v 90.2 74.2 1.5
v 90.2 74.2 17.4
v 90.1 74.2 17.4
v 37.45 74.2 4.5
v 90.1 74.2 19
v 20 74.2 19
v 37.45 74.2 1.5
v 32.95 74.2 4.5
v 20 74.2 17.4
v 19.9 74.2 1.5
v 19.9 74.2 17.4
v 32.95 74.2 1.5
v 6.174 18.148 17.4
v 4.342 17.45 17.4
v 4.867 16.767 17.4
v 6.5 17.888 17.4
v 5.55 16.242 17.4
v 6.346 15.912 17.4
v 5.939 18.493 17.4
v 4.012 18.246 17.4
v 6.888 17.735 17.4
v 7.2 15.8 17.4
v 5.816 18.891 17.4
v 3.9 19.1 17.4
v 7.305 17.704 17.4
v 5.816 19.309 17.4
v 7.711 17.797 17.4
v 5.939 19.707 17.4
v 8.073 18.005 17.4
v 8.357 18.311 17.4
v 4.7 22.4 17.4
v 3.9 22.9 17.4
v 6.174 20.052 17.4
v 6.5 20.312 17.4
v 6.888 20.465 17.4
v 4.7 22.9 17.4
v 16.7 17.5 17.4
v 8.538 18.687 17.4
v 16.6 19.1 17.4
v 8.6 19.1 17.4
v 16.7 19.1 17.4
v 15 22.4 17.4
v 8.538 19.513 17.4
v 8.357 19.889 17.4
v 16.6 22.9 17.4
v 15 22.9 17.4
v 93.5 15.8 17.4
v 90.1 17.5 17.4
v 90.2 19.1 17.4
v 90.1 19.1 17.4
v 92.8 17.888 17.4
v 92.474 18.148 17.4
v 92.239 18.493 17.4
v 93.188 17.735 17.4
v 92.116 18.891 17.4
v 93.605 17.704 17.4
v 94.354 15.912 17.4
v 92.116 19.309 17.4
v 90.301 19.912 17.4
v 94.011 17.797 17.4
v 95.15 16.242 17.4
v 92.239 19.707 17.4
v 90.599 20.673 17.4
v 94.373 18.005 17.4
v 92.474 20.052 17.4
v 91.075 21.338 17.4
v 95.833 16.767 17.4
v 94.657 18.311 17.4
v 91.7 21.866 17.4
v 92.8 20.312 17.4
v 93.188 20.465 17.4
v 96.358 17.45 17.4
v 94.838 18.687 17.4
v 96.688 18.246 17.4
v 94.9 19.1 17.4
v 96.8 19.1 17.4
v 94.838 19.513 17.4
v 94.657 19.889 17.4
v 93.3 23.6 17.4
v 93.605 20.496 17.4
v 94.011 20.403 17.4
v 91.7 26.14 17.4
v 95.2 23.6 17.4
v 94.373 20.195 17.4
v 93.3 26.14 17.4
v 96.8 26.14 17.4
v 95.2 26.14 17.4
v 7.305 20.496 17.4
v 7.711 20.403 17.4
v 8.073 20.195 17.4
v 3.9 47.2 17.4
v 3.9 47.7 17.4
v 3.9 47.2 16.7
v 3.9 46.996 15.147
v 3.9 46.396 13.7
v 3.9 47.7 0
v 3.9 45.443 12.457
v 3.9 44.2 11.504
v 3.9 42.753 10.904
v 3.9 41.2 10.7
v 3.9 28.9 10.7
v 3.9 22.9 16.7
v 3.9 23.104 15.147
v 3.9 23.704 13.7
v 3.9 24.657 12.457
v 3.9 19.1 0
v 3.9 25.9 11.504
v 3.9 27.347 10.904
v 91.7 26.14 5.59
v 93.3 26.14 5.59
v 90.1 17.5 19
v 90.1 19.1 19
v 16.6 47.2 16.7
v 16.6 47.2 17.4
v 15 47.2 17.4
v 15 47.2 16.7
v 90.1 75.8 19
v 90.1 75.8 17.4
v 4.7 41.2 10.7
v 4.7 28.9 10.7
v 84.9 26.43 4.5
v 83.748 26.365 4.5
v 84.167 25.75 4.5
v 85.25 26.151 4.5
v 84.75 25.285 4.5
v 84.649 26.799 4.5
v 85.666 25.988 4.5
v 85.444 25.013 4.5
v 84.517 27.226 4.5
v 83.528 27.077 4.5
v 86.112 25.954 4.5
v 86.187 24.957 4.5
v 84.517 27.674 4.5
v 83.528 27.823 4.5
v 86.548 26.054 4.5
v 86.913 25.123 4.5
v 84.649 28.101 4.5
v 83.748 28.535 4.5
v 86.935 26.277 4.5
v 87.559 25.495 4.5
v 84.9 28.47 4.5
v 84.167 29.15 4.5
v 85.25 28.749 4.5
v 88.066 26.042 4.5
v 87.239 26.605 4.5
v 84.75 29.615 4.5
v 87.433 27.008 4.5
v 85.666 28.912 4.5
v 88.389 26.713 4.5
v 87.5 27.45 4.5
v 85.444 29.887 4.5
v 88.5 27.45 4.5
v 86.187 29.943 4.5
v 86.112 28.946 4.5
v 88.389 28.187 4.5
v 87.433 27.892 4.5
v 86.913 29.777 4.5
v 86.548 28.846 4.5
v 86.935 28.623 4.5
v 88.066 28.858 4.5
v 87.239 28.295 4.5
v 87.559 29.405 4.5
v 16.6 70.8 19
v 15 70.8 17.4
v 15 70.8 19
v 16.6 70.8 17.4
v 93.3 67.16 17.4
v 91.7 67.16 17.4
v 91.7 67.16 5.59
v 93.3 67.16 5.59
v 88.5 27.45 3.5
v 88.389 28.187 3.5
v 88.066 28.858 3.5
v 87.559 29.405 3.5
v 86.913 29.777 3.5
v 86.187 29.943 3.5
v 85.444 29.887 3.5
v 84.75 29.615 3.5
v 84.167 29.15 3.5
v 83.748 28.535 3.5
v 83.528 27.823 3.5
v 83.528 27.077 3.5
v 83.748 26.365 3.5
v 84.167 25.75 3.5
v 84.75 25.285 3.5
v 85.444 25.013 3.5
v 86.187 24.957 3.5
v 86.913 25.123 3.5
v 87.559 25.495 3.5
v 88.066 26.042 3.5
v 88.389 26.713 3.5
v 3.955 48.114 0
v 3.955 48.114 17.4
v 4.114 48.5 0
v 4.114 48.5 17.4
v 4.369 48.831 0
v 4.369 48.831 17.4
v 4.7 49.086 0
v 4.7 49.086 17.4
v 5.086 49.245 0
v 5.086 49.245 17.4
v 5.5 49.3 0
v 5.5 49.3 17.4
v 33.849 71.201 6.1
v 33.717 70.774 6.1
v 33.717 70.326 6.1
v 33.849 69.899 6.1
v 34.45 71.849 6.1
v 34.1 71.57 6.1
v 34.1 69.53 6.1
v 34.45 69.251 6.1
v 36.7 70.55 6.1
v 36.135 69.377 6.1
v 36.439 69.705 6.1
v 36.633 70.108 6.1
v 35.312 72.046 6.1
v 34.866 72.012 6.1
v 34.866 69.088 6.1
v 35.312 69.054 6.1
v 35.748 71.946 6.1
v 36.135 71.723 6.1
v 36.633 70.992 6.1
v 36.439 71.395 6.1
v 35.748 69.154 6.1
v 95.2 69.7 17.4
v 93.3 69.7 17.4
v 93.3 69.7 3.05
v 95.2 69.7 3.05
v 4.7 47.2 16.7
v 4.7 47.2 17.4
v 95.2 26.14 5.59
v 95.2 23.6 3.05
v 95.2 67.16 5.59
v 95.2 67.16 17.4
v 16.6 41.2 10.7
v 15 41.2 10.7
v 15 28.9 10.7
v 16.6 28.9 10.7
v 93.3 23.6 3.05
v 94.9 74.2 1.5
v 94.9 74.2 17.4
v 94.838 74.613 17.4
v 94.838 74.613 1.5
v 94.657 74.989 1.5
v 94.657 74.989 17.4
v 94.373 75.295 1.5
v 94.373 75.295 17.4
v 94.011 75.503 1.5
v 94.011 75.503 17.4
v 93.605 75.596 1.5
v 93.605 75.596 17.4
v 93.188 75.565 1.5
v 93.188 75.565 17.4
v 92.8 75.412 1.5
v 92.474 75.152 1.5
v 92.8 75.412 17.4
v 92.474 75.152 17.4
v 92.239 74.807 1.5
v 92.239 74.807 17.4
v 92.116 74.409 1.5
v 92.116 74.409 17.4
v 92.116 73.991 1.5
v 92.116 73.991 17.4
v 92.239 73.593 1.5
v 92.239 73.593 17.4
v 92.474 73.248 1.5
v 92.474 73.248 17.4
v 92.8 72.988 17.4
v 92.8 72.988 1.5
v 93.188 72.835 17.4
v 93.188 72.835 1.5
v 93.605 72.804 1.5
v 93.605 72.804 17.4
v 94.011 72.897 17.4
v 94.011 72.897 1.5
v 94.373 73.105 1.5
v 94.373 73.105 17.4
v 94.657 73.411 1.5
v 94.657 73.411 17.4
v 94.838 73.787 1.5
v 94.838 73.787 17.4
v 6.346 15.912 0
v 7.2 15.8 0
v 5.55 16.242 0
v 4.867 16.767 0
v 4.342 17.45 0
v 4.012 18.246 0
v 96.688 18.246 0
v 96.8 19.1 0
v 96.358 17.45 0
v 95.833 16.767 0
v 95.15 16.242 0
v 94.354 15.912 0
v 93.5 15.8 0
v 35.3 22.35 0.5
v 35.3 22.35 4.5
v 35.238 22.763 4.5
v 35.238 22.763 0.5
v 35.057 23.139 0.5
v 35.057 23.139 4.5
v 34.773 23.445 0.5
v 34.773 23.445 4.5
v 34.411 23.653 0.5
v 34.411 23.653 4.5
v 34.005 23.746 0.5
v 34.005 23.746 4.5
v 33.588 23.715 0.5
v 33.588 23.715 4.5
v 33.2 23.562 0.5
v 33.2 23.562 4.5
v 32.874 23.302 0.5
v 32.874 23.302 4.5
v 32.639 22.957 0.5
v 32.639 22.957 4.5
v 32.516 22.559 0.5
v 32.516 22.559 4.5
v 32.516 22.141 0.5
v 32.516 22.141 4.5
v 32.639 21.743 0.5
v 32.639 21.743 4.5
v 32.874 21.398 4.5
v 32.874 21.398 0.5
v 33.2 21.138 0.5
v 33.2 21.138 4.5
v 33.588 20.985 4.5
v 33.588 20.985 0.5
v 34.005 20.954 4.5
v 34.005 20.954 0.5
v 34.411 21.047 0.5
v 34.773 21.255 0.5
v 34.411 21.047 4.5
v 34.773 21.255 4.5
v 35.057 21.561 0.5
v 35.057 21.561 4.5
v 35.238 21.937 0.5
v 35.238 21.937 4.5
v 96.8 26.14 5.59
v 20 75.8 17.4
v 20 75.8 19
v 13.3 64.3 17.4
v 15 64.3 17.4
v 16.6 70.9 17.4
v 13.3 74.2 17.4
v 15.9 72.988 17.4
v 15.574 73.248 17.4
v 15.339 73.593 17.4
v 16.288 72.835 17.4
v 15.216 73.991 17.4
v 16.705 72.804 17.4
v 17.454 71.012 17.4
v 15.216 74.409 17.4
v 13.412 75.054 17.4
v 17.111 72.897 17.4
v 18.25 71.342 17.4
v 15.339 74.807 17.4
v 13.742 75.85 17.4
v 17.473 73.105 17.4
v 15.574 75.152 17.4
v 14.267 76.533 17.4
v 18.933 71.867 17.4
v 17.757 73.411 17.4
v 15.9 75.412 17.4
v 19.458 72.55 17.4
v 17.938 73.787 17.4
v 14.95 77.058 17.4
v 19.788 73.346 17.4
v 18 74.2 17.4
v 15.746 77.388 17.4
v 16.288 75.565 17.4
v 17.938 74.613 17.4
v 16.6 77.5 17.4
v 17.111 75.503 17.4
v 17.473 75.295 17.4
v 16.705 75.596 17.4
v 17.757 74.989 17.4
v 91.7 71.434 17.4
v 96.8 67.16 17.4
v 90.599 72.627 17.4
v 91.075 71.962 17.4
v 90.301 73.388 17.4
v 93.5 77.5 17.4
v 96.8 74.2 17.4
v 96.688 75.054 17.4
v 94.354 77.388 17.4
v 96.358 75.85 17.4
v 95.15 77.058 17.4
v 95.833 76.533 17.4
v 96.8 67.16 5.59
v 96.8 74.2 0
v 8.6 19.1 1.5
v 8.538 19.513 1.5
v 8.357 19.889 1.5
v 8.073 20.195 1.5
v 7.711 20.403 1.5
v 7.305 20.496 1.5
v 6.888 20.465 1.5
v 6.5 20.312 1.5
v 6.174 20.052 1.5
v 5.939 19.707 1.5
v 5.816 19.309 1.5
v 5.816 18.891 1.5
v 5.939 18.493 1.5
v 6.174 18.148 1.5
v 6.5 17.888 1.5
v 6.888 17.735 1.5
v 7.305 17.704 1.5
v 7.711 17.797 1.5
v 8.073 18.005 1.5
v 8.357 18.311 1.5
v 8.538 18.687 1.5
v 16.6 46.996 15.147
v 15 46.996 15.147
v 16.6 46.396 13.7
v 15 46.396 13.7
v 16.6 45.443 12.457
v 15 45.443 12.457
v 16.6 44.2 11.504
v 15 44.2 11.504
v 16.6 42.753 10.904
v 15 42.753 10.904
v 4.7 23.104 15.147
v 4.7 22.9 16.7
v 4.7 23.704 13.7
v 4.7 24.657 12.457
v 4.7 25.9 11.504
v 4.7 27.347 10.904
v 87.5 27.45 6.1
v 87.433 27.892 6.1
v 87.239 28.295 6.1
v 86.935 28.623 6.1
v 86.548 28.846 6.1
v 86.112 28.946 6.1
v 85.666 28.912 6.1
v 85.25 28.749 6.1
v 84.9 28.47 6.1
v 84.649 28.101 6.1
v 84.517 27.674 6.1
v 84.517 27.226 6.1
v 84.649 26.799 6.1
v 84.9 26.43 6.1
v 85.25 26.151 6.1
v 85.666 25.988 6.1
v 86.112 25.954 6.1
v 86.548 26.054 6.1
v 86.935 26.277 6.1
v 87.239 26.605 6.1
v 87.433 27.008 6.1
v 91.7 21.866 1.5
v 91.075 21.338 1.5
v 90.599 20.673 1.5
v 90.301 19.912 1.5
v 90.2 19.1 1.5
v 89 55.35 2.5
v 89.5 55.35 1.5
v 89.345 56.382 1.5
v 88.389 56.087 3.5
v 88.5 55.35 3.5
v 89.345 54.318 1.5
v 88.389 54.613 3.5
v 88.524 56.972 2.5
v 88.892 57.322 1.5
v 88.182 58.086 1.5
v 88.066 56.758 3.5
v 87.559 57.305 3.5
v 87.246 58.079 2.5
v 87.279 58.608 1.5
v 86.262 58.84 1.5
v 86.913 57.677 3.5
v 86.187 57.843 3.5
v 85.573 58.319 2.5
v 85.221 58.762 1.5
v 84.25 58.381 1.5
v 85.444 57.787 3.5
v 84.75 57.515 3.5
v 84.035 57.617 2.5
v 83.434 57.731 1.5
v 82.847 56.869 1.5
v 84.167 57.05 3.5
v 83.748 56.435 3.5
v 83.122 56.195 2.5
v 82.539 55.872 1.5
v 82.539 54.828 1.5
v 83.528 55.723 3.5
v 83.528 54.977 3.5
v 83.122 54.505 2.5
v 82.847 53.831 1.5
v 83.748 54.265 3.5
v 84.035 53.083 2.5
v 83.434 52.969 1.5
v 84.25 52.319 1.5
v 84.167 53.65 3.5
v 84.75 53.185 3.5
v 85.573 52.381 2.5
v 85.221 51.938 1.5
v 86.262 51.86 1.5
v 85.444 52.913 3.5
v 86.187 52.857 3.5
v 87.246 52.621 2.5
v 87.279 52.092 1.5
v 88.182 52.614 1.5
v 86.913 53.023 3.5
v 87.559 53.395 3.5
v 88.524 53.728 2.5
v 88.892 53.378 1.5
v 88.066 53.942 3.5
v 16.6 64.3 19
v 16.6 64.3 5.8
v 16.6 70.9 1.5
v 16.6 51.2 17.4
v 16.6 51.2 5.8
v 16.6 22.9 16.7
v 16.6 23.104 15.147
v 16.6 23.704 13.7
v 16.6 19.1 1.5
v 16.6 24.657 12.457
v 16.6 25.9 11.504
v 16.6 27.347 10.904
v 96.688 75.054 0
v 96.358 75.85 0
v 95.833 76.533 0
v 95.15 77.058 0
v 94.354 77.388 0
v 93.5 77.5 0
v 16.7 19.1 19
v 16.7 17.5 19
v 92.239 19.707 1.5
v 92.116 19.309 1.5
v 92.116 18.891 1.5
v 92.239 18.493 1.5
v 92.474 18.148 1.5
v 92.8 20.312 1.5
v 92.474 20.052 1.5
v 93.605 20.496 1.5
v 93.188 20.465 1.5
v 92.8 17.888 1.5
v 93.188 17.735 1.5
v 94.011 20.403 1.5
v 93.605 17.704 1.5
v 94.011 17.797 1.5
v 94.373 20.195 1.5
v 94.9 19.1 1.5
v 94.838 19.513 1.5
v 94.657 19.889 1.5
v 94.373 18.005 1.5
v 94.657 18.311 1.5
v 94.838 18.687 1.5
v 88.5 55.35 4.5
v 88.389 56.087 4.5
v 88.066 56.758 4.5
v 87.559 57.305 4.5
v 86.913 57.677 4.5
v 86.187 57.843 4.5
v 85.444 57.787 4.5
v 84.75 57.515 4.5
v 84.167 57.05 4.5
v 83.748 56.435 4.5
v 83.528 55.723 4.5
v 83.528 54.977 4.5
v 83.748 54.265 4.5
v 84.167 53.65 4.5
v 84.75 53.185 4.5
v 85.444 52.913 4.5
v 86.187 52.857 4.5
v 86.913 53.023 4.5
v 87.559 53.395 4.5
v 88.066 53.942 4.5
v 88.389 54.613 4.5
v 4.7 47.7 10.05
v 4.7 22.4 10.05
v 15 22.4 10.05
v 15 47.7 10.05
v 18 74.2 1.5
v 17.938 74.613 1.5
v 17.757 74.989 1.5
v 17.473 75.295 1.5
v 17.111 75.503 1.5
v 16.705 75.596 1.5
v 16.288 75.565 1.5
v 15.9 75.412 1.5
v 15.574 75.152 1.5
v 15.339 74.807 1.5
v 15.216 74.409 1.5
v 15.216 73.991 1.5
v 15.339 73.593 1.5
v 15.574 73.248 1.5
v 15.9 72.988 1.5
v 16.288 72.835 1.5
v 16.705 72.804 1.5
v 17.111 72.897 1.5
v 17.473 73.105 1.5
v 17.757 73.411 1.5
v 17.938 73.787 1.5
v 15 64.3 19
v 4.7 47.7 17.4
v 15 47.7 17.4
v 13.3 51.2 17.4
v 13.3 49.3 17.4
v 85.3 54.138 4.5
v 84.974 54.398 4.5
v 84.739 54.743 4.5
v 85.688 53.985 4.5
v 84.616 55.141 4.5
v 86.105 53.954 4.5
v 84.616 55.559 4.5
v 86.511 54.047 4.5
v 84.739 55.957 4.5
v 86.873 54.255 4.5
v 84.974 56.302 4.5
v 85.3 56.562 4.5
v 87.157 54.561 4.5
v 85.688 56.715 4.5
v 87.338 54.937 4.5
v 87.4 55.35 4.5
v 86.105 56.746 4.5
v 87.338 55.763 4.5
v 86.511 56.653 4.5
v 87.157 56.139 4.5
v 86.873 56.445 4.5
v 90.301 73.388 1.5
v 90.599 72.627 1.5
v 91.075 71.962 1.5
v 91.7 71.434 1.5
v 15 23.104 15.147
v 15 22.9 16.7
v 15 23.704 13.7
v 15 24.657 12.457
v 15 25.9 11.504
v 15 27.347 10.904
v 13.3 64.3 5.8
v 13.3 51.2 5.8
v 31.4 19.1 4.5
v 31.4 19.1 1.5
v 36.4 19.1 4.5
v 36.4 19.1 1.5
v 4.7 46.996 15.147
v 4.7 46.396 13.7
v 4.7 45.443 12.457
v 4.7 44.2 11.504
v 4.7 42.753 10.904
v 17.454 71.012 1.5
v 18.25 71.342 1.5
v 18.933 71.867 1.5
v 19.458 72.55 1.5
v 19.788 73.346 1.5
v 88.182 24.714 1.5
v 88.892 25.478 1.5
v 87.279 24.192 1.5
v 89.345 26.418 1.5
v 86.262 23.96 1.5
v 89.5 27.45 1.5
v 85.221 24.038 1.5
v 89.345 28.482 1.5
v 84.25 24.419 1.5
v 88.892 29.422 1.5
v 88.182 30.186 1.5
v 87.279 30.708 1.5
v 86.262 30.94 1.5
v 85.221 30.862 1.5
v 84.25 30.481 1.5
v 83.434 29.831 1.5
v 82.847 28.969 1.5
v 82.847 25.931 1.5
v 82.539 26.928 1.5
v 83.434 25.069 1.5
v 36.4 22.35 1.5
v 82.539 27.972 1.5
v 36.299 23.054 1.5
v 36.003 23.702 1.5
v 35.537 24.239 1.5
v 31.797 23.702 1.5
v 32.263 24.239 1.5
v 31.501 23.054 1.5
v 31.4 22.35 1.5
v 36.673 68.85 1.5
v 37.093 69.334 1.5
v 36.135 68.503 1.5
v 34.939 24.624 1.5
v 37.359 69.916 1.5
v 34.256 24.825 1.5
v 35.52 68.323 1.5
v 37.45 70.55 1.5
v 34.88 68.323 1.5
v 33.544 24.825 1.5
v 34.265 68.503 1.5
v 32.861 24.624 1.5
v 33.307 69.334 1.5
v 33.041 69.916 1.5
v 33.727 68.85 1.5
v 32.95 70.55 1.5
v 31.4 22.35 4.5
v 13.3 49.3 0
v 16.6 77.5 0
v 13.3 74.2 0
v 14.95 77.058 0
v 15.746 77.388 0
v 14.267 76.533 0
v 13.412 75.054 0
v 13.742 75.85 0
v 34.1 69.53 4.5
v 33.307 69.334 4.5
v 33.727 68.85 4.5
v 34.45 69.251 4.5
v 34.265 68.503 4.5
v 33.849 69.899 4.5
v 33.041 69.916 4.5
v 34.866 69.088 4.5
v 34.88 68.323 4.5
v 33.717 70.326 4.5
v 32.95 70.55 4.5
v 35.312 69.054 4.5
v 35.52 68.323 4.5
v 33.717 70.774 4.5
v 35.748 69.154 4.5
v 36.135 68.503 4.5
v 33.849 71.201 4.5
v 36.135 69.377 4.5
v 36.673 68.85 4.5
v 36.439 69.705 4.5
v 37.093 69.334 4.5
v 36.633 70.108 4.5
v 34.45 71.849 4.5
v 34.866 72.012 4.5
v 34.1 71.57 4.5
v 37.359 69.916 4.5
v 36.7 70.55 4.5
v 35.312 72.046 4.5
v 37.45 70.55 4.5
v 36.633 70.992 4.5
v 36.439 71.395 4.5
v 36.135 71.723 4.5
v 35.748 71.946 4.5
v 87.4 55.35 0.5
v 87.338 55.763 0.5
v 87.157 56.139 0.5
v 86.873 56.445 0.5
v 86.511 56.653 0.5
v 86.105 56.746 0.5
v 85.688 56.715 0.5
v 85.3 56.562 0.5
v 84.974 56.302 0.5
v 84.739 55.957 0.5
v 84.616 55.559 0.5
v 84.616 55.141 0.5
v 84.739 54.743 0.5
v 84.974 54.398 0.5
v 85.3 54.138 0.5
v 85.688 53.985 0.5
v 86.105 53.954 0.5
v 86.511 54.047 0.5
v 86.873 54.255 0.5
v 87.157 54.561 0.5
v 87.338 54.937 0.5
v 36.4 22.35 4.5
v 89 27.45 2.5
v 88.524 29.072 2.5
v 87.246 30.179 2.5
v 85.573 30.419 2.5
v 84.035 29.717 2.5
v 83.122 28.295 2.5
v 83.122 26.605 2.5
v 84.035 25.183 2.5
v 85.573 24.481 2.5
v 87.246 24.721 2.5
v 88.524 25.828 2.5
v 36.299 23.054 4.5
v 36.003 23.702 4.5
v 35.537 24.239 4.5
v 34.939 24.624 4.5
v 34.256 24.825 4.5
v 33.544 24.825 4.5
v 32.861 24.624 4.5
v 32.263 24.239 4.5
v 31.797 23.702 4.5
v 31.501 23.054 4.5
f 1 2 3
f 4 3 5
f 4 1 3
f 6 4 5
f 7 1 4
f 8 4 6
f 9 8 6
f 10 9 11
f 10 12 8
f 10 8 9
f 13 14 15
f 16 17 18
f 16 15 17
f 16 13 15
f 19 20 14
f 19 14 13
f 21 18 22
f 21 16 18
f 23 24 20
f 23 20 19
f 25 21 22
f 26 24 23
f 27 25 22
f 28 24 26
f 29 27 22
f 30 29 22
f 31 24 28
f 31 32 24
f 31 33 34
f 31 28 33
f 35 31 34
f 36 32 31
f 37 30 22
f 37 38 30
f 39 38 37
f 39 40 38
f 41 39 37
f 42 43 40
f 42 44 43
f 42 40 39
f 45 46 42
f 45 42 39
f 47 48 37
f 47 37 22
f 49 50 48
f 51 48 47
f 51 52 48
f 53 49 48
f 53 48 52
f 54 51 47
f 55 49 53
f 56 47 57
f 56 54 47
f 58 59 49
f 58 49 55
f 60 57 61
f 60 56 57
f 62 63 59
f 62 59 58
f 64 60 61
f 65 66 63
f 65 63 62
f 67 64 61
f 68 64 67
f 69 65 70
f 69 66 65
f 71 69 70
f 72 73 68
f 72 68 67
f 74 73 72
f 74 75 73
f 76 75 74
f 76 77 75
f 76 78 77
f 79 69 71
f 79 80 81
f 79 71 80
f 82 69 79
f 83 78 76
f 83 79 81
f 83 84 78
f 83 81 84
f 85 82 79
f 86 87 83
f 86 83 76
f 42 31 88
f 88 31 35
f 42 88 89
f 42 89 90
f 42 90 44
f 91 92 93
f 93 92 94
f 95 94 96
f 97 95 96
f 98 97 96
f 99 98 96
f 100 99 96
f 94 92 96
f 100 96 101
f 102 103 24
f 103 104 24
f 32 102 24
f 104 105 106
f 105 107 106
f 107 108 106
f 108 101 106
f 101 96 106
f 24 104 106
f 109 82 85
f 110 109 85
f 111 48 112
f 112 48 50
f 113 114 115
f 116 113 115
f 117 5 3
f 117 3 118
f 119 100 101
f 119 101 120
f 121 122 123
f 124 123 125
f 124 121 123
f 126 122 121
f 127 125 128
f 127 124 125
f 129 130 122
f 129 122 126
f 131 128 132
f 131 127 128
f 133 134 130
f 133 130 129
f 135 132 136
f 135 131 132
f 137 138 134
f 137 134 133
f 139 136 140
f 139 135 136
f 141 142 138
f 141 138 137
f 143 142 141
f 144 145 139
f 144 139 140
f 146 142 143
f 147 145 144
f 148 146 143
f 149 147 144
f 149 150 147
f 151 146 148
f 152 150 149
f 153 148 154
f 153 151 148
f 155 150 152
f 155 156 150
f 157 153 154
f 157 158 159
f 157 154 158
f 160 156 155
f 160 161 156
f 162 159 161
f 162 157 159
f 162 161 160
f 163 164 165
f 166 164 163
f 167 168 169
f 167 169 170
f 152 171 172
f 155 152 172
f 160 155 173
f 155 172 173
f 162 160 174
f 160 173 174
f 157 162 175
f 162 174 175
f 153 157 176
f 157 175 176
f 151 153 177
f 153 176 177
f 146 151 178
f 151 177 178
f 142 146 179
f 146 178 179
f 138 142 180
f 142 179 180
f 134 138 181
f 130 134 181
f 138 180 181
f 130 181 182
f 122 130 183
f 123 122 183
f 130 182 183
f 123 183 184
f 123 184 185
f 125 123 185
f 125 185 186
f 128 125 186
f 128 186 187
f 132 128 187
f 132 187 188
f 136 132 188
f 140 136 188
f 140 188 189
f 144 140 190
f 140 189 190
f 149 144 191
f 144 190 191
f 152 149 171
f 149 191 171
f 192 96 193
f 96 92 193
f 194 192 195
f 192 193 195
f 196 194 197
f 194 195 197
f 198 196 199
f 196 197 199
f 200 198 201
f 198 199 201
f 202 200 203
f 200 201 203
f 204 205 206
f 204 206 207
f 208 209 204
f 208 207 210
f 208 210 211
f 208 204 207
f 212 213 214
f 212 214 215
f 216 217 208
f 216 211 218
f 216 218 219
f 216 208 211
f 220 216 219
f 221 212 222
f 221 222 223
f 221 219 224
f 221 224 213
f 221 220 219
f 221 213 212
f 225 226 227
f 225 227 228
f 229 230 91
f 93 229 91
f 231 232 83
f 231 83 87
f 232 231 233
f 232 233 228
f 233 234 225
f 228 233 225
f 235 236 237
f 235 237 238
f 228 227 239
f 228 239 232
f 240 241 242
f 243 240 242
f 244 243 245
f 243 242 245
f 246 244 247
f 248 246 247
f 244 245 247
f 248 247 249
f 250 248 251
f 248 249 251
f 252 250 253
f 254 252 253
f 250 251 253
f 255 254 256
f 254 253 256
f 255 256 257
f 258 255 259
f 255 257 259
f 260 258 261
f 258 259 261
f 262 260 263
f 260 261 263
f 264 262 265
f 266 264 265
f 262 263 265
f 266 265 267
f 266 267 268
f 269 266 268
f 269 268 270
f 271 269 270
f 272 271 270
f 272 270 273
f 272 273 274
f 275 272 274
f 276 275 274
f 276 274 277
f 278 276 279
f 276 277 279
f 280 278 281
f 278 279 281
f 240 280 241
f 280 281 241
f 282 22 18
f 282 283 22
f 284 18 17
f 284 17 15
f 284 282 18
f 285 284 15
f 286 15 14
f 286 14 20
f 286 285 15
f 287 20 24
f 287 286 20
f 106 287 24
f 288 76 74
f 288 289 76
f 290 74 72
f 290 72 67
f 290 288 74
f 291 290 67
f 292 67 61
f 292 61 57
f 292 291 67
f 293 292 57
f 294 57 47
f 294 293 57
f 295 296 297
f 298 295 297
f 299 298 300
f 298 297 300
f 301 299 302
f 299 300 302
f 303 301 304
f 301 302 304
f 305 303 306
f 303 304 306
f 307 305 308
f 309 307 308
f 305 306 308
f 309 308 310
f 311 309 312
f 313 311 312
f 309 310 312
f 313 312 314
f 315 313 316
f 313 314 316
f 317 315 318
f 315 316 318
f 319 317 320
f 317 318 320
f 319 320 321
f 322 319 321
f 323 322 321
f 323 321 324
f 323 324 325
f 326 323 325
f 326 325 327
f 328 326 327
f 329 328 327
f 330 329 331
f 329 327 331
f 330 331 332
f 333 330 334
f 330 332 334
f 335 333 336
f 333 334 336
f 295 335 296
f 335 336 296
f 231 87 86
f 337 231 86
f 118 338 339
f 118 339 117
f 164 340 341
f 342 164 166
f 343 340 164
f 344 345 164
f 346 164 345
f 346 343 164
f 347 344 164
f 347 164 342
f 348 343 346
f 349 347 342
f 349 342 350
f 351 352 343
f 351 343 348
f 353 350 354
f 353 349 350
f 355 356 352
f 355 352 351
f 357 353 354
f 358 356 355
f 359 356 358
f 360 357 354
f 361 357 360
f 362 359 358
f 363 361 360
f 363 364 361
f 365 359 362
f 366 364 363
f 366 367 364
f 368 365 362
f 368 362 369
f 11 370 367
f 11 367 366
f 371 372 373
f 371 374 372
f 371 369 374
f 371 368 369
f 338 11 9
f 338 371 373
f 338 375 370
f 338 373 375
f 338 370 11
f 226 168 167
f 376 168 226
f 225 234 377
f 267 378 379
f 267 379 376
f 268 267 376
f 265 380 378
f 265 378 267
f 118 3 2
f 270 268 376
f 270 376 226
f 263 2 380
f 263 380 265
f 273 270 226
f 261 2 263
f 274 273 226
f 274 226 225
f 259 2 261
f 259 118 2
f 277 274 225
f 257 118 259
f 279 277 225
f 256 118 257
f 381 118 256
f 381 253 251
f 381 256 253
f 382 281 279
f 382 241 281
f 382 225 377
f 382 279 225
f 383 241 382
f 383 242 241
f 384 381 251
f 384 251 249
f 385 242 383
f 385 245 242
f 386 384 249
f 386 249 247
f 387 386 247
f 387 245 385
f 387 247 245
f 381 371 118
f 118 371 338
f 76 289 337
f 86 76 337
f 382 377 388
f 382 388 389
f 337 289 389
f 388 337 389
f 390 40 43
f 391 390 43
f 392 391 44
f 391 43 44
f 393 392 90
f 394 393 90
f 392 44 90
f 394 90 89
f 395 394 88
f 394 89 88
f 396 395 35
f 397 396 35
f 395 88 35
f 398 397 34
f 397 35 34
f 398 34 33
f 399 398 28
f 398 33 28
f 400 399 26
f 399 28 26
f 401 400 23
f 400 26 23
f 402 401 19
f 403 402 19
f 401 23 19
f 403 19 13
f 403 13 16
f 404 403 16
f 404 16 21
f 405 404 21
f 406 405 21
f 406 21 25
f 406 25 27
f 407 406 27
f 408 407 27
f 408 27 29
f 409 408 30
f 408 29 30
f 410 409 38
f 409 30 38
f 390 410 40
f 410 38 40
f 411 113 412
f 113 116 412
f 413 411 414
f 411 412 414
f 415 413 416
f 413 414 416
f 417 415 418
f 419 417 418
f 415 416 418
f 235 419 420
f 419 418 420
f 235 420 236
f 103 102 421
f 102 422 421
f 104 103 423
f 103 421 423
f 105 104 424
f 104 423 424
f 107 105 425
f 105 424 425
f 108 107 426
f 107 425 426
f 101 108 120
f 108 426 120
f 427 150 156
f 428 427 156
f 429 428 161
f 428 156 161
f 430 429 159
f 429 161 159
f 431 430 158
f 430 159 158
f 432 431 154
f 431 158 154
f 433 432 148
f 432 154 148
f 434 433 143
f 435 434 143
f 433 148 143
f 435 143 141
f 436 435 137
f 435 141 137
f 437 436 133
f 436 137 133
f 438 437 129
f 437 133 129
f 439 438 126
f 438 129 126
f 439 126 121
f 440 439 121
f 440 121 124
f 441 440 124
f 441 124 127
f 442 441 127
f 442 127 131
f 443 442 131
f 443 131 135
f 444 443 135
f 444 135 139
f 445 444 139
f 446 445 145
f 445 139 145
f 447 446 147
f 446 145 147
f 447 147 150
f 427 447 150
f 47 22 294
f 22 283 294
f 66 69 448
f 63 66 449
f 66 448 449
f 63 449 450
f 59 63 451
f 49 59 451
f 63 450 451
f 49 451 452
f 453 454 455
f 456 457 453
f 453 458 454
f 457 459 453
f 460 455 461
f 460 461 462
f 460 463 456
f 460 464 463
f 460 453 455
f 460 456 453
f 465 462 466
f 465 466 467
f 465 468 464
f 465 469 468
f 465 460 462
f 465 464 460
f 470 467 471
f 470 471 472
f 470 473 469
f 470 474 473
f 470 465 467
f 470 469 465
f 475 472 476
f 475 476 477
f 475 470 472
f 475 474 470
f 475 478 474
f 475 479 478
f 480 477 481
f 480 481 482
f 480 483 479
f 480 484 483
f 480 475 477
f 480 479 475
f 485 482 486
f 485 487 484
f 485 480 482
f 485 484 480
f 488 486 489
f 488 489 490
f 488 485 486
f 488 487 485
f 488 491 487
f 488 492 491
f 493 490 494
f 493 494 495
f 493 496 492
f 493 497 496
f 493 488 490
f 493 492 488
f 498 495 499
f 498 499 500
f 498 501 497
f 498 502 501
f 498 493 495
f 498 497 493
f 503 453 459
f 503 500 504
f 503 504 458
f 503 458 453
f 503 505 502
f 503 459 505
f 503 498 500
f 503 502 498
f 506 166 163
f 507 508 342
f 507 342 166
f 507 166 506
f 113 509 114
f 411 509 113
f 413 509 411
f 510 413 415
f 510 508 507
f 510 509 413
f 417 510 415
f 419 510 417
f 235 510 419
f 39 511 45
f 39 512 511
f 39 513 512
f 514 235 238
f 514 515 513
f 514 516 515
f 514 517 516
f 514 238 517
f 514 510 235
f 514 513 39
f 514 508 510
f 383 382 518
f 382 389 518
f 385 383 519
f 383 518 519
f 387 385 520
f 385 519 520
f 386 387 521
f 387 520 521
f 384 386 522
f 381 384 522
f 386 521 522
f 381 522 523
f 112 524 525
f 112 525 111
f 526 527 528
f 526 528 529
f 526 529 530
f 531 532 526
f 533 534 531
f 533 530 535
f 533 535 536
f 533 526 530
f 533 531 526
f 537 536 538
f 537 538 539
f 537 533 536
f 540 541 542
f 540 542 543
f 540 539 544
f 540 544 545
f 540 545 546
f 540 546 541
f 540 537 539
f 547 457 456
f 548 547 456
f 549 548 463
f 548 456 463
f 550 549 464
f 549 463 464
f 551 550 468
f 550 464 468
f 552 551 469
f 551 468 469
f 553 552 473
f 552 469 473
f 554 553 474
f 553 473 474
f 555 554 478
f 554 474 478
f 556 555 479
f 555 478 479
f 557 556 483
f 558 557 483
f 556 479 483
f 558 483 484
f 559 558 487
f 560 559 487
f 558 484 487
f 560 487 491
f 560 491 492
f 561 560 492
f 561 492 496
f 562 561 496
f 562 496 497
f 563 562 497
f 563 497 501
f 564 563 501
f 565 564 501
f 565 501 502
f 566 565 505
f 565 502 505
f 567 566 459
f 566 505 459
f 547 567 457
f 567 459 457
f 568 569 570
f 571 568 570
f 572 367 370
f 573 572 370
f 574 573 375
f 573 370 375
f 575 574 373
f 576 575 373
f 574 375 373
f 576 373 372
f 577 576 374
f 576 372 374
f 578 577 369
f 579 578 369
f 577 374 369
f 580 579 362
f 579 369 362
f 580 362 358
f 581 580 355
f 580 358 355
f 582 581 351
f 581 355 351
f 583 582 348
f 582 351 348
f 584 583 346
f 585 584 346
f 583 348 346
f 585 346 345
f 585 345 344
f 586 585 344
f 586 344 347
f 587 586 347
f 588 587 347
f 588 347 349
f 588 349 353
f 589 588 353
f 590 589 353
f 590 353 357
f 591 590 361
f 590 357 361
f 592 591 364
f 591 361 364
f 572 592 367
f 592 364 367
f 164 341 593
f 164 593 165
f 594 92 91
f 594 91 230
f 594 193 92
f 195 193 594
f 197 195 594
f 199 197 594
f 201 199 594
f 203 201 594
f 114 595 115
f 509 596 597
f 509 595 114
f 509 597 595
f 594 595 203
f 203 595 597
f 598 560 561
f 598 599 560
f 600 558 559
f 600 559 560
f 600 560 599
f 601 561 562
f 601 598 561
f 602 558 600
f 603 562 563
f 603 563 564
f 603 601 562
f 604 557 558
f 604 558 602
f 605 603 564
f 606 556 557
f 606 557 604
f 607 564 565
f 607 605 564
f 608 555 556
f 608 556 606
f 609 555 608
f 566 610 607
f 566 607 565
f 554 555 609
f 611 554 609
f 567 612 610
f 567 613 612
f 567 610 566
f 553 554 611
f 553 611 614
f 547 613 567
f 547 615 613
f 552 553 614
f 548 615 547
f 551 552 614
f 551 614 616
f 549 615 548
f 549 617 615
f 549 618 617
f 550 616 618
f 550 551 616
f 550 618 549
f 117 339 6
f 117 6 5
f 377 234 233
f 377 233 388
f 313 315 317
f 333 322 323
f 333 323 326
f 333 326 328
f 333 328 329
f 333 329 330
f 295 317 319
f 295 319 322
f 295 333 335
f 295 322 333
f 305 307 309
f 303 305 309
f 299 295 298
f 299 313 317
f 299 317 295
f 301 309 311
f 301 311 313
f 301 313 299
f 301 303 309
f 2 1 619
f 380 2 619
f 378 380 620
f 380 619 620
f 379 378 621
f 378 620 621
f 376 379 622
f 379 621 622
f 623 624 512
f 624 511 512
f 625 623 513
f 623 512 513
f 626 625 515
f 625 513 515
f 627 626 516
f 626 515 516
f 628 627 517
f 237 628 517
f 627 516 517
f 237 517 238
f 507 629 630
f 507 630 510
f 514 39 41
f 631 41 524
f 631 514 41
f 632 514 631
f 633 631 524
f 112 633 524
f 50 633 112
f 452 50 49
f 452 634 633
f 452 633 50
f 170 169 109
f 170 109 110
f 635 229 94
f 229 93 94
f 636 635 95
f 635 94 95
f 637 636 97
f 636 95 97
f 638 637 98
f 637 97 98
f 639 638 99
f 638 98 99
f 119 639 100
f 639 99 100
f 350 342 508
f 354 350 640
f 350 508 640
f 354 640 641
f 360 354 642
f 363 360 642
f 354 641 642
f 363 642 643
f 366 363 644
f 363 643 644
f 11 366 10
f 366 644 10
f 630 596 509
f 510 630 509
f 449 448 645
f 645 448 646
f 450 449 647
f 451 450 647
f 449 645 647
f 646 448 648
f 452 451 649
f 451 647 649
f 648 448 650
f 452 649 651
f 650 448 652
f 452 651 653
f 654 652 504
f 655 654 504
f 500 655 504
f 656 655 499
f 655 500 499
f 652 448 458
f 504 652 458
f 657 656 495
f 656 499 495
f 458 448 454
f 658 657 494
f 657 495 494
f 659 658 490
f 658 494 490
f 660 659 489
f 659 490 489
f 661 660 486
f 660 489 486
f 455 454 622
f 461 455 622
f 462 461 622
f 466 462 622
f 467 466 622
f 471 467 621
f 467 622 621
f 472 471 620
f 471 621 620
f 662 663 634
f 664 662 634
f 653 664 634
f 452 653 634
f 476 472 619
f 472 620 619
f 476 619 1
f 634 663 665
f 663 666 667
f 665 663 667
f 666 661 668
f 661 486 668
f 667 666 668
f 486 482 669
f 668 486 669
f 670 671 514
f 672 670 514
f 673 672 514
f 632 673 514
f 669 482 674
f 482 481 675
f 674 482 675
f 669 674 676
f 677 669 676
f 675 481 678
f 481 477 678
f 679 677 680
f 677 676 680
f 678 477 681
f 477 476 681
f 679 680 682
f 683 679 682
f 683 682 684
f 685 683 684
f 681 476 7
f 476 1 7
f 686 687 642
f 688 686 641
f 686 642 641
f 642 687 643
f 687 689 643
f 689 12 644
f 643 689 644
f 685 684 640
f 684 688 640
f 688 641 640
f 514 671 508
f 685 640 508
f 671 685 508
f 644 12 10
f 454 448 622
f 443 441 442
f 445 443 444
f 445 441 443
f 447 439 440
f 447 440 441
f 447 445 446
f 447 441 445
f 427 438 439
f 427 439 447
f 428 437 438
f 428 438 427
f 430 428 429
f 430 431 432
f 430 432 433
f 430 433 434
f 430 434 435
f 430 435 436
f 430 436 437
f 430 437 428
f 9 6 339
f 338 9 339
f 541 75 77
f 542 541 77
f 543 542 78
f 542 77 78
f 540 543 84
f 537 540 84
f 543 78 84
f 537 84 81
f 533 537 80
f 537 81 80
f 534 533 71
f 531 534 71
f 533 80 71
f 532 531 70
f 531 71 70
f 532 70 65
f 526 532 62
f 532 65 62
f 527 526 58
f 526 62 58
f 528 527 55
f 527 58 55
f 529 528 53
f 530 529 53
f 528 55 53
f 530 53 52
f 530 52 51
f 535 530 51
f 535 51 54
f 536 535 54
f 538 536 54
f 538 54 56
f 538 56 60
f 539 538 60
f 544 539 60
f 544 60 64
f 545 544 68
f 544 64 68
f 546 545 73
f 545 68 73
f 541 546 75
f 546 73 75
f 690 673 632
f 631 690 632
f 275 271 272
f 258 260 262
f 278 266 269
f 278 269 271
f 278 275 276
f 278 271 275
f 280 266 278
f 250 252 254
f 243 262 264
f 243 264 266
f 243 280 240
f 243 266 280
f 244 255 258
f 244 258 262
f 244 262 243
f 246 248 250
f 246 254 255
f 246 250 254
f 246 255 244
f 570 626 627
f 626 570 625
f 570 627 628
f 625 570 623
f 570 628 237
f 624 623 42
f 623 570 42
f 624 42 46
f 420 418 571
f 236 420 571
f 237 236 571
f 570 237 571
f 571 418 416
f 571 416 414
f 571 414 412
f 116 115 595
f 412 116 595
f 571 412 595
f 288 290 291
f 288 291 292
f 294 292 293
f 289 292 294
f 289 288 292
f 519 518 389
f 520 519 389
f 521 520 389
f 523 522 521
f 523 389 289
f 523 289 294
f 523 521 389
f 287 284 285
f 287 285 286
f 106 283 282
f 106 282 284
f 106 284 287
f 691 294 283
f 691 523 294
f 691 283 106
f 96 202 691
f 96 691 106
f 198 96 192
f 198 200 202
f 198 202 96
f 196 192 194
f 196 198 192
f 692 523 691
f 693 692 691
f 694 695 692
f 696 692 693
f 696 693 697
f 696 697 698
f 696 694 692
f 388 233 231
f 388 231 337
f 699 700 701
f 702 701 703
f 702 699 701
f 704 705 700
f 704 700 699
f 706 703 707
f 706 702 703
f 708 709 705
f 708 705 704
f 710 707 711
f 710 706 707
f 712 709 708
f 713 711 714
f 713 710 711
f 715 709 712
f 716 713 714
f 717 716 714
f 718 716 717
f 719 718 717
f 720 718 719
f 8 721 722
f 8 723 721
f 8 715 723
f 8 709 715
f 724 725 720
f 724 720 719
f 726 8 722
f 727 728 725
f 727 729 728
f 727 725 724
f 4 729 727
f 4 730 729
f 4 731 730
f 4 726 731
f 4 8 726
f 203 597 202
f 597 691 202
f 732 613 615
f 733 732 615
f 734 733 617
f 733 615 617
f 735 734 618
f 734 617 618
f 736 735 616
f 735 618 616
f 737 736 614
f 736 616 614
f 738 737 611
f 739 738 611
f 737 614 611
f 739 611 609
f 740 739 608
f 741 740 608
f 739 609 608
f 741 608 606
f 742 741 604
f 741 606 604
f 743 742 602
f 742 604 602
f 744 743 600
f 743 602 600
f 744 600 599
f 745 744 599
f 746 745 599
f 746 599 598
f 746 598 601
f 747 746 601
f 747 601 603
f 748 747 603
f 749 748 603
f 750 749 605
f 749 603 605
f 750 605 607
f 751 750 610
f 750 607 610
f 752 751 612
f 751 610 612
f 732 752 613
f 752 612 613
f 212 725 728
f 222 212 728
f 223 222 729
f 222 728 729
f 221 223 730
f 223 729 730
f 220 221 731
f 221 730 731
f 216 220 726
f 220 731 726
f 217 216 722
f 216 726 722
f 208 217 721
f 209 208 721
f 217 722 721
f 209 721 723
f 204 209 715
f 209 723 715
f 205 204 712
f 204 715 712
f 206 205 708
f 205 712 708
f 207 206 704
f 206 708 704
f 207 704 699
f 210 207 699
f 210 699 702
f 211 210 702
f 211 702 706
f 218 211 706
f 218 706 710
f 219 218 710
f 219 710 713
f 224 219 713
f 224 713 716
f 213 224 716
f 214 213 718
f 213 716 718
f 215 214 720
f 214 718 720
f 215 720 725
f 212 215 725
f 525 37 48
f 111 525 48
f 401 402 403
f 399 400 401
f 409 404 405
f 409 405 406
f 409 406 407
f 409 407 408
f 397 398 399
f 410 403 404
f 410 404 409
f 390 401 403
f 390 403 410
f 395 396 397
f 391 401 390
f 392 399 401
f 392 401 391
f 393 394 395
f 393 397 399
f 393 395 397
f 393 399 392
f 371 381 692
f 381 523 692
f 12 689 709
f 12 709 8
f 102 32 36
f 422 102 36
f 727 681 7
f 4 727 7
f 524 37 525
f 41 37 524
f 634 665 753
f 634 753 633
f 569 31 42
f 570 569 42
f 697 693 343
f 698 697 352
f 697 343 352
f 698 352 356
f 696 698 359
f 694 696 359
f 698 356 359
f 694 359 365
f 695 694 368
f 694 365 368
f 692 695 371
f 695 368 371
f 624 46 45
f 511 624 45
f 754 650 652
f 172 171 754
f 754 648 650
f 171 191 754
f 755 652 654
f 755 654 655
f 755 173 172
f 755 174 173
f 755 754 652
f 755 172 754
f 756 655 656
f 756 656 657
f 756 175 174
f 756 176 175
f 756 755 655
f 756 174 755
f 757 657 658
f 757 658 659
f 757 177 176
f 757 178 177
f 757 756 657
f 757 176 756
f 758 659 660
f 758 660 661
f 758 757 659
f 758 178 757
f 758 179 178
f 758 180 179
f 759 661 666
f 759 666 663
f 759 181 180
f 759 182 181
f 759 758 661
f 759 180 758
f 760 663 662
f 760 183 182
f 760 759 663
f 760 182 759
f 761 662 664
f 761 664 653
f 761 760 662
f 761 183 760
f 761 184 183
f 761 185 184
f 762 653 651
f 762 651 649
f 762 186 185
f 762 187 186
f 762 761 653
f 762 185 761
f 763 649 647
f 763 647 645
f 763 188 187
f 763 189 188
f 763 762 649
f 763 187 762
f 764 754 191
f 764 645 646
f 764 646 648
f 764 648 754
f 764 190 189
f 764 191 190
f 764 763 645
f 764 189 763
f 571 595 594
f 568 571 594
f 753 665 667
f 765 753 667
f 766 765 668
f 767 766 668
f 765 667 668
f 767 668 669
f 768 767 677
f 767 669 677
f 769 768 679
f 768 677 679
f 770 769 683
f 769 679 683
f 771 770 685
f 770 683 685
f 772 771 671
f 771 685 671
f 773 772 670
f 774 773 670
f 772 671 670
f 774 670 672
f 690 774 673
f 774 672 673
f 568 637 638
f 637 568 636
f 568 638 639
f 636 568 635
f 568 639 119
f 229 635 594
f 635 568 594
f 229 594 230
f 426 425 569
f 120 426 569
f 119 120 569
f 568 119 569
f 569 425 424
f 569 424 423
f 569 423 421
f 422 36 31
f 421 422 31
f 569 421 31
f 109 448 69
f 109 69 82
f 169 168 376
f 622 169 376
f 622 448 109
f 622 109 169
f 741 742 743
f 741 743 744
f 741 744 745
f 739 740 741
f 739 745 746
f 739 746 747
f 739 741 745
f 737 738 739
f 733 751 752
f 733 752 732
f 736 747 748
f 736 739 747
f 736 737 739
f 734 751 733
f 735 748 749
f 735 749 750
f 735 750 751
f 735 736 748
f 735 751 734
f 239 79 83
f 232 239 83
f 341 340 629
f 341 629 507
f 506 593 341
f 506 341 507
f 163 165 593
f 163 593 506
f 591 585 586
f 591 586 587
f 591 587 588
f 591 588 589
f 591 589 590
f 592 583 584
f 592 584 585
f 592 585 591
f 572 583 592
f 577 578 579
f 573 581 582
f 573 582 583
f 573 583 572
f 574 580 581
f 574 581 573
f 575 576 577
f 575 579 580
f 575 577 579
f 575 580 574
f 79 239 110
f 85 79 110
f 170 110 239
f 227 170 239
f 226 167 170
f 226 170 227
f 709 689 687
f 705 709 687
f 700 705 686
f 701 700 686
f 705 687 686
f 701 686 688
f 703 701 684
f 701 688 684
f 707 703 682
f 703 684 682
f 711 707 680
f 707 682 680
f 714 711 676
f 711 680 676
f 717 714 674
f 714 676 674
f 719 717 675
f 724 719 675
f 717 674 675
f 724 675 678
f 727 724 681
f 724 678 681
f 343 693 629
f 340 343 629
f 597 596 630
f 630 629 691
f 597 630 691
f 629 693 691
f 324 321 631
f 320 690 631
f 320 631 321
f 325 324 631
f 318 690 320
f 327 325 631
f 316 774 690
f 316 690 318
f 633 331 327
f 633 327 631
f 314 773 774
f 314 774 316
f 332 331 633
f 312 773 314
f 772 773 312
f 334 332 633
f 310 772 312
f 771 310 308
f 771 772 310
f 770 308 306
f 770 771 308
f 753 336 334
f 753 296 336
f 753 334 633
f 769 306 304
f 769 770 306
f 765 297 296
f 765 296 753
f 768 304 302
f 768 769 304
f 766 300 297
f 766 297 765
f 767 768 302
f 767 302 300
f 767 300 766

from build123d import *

# Parameters (mm, degrees)
PAD_DEPTH       = 1.5
PAD001_DEPTH    = 15.9
SKETCH003_R     = 2.5
PAD002_DEPTH    = 3
SKETCH004_R     = 1.5
PAD003_DEPTH    = 1.6
SKETCH005_W     = 70.1
SKETCH005_H     = 1.6
SKETCH005_W_2   = 1.6
SKETCH005_H_2   = 11.9
SKETCH005_W_3   = 73.4
PAD004_DEPTH    = 1.6
SKETCH007_W     = 1.9
SKETCH007_H     = 46.1
POCKET001_DEPTH = 14.35
SKETCH008_W     = 5.6
SKETCH008_H     = 41.02
POCKET002_DEPTH = 11.81
SKETCH009_W     = 4.8
SKETCH009_H     = 13.1
POCKET003_DEPTH = 13.2
SKETCH010_R     = 1.4
POCKET004_DEPTH = 15.9
POCKET_DEPTH    = 6.7
SKETCH014_W     = 10.3
SKETCH014_H     = 25.3
POCKET006_DEPTH = 0.65
SKETCH023_R     = 1.4
POCKET014_DEPTH = 4
CHAMFER_SIZE2   = 2
CHAMFER_SIZE    = 1
FILLET_R        = 3.3
FILLET001_R     = 1.6
FILLET002_R     = 6


with BuildPart() as part:
    # Sketch → Pad (new body)
    with BuildSketch(Plane.XY):
        Polygon((13.3, 49.3), (13.3, 77.5), (96.8, 77.5), (96.8, 15.8), (3.9, 15.8), (3.9, 49.3), align=None)
    extrude(amount=PAD_DEPTH)

    # Sketch001 (on Face8 of Pad) → Pad001 (join)
    with BuildSketch(Plane.XY.offset(1.5)):
        Polygon((96.8, 77.5), (13.3, 77.5), (13.3, 49.3), (3.9, 49.3), (3.9, 15.8), (96.8, 15.8), align=None)
        with BuildLine():
            Line((16.6, 70.9), (16.6, 19.1))
            Line((16.6, 19.1), (90.2, 19.1))
            ThreePointArc((91.7, 21.865863), (90.599138, 20.673213), (90.2, 19.1))
            Line((91.7, 21.865863), (91.7, 71.434137))
            ThreePointArc((90.2, 74.2), (90.599138, 72.626787), (91.7, 71.434137))
            Line((90.2, 74.2), (19.9, 74.2))
            ThreePointArc((16.6, 70.9), (18.933452, 71.866548), (19.9, 74.2))
        make_face(mode=Mode.SUBTRACT)
    extrude(amount=PAD001_DEPTH)

    # Sketch003 (on Face9 of Pad001) → Pad002 (join)
    with BuildSketch(Plane.XY.offset(1.5)):
        with Locations((86, 55.35)):
            Circle(SKETCH003_R)
        with Locations((86, 27.45)):
            Circle(SKETCH003_R)
        with BuildLine():
            ThreePointArc((36.4, 22.35), (33.9, 24.85), (31.4, 22.35))
            Line((31.4, 22.35), (31.4, 18))
            Line((36.4, 18), (31.4, 18))
            Line((36.4, 22.35), (36.4, 18))
        make_face()
        with BuildLine():
            ThreePointArc((32.95, 70.55), (35.2, 68.3), (37.45, 70.55))
            Line((37.45, 70.55), (37.45, 75.55))
            Line((32.95, 75.55), (37.45, 75.55))
            Line((32.95, 70.55), (32.95, 75.55))
        make_face()
    extrude(amount=PAD002_DEPTH)

    # Sketch004 (on Face28 of Pad002) → Pad003 (join)
    with BuildSketch(Plane.XY.offset(4.5)):
        with Locations((35.2, 70.55)):
            Circle(SKETCH004_R)
        with Locations((86, 27.45)):
            Circle(SKETCH004_R)
    extrude(amount=PAD003_DEPTH)

    # Sketch005 (on Face1 of Pad003) → Pad004 (join)
    with BuildSketch(Plane.XY.offset(17.4)):
        with Locations((55.05, 75)):
            Rectangle(SKETCH005_W, SKETCH005_H)
        with Locations((15.8, 64.85)):
            Rectangle(SKETCH005_W_2, SKETCH005_H_2)
        with Locations((53.4, 18.3)):
            Rectangle(SKETCH005_W_3, SKETCH005_H)
    extrude(amount=PAD004_DEPTH)

    # Sketch007 (on Face1 of Pad004) → Pocket001 (cut)
    with BuildSketch(Plane.XY.offset(17.4)):
        with Locations((94.25, 46.65)):
            Rectangle(SKETCH007_W, SKETCH007_H)
    extrude(amount=-POCKET001_DEPTH, mode=Mode.SUBTRACT)

    # Sketch008 (on Face1 of Pocket001) → Pocket002 (cut)
    with BuildSketch(Plane.XY.offset(17.4)):
        with Locations((94.25, 46.65)):
            Rectangle(SKETCH008_W, SKETCH008_H)
    extrude(amount=-POCKET002_DEPTH, mode=Mode.SUBTRACT)

    # Sketch009 (on Face41 of Pocket002) → Pocket003 (cut)
    with BuildSketch(Plane.XY.offset(19)):
        with Locations((14.6, 57.75)):
            Rectangle(SKETCH009_W, SKETCH009_H)
    extrude(amount=-POCKET003_DEPTH, mode=Mode.SUBTRACT)

    # Sketch010 (on Face1 of Pocket003) → Pocket004 (cut)
    with BuildSketch(Plane.XY.offset(17.4)):
        with Locations((16.6, 74.2)):
            Circle(SKETCH010_R)
        with Locations((93.5, 74.2)):
            Circle(SKETCH010_R)
        with Locations((93.5, 19.1)):
            Circle(SKETCH010_R)
        with Locations((7.2, 19.1)):
            Circle(SKETCH010_R)
    extrude(amount=-POCKET004_DEPTH, mode=Mode.SUBTRACT)

    # Sketch002 (on Face1 of Pad001) → Pocket (cut)
    with BuildSketch(Plane.XY.offset(17.4)):
        Polygon((4.7, 22.4), (15, 22.4), (15, 22.9), (18.2, 22.9), (18.2, 47.2), (15, 47.2), (15, 47.7), (4.7, 47.7), (4.7, 47.2), (1.5, 47.2), (1.5, 22.9), (4.7, 22.9), align=None)
    extrude(amount=-POCKET_DEPTH, mode=Mode.SUBTRACT)

    # Sketch014 (on Face41 of Pocket) → Pocket006 (cut)
    with BuildSketch(Plane.XY.offset(10.7)):
        with Locations((9.85, 35.05)):
            Rectangle(SKETCH014_W, SKETCH014_H)
    extrude(amount=-POCKET006_DEPTH, mode=Mode.SUBTRACT)

    # Sketch023 (on Face70 of Pocket006) → Pocket014 (cut)
    with BuildSketch(Plane.XY.offset(4.5)):
        with Locations((33.9, 22.35)):
            Circle(SKETCH023_R)
        with Locations((86, 55.35)):
            Circle(SKETCH023_R)
    extrude(amount=-POCKET014_DEPTH, mode=Mode.SUBTRACT)

    # Chamfer
    chamfer_edges = [part.edges().sort_by_distance(p)[0] for p in [
        (83.5, 55.35, 1.5),
        (83.5, 27.45, 1.5),
    ]]
    chamfer_side = part.faces().sort_by_distance((54.108445, 46.65668, 1.5))[0]
    chamfer(chamfer_edges, length=CHAMFER_SIZE, length2=CHAMFER_SIZE2, reference=chamfer_side)

    # Fillet
    fillet_edges = [part.edges().sort_by_distance(p)[0] for p in [
        (13.3, 77.5, 8.7),
        (3.9, 15.8, 8.7),
        (96.8, 77.5, 8.7),
        (96.8, 15.8, 8.7),
    ]]
    fillet(fillet_edges, radius=FILLET_R)

    # Fillet001
    fillet001_edges = [part.edges().sort_by_distance(p)[0] for p in [
        (3.9, 49.3, 8.7),
    ]]
    fillet(fillet001_edges, radius=FILLET001_R)

    # Fillet002
    fillet002_edges = [part.edges().sort_by_distance(p)[0] for p in [
        (15.8, 22.9, 10.7),
        (15.8, 47.2, 10.7),
        (4.3, 47.2, 10.7),
        (4.3, 22.9, 10.7),
    ]]
    fillet(fillet002_edges, radius=FILLET002_R)


solid = part.part
